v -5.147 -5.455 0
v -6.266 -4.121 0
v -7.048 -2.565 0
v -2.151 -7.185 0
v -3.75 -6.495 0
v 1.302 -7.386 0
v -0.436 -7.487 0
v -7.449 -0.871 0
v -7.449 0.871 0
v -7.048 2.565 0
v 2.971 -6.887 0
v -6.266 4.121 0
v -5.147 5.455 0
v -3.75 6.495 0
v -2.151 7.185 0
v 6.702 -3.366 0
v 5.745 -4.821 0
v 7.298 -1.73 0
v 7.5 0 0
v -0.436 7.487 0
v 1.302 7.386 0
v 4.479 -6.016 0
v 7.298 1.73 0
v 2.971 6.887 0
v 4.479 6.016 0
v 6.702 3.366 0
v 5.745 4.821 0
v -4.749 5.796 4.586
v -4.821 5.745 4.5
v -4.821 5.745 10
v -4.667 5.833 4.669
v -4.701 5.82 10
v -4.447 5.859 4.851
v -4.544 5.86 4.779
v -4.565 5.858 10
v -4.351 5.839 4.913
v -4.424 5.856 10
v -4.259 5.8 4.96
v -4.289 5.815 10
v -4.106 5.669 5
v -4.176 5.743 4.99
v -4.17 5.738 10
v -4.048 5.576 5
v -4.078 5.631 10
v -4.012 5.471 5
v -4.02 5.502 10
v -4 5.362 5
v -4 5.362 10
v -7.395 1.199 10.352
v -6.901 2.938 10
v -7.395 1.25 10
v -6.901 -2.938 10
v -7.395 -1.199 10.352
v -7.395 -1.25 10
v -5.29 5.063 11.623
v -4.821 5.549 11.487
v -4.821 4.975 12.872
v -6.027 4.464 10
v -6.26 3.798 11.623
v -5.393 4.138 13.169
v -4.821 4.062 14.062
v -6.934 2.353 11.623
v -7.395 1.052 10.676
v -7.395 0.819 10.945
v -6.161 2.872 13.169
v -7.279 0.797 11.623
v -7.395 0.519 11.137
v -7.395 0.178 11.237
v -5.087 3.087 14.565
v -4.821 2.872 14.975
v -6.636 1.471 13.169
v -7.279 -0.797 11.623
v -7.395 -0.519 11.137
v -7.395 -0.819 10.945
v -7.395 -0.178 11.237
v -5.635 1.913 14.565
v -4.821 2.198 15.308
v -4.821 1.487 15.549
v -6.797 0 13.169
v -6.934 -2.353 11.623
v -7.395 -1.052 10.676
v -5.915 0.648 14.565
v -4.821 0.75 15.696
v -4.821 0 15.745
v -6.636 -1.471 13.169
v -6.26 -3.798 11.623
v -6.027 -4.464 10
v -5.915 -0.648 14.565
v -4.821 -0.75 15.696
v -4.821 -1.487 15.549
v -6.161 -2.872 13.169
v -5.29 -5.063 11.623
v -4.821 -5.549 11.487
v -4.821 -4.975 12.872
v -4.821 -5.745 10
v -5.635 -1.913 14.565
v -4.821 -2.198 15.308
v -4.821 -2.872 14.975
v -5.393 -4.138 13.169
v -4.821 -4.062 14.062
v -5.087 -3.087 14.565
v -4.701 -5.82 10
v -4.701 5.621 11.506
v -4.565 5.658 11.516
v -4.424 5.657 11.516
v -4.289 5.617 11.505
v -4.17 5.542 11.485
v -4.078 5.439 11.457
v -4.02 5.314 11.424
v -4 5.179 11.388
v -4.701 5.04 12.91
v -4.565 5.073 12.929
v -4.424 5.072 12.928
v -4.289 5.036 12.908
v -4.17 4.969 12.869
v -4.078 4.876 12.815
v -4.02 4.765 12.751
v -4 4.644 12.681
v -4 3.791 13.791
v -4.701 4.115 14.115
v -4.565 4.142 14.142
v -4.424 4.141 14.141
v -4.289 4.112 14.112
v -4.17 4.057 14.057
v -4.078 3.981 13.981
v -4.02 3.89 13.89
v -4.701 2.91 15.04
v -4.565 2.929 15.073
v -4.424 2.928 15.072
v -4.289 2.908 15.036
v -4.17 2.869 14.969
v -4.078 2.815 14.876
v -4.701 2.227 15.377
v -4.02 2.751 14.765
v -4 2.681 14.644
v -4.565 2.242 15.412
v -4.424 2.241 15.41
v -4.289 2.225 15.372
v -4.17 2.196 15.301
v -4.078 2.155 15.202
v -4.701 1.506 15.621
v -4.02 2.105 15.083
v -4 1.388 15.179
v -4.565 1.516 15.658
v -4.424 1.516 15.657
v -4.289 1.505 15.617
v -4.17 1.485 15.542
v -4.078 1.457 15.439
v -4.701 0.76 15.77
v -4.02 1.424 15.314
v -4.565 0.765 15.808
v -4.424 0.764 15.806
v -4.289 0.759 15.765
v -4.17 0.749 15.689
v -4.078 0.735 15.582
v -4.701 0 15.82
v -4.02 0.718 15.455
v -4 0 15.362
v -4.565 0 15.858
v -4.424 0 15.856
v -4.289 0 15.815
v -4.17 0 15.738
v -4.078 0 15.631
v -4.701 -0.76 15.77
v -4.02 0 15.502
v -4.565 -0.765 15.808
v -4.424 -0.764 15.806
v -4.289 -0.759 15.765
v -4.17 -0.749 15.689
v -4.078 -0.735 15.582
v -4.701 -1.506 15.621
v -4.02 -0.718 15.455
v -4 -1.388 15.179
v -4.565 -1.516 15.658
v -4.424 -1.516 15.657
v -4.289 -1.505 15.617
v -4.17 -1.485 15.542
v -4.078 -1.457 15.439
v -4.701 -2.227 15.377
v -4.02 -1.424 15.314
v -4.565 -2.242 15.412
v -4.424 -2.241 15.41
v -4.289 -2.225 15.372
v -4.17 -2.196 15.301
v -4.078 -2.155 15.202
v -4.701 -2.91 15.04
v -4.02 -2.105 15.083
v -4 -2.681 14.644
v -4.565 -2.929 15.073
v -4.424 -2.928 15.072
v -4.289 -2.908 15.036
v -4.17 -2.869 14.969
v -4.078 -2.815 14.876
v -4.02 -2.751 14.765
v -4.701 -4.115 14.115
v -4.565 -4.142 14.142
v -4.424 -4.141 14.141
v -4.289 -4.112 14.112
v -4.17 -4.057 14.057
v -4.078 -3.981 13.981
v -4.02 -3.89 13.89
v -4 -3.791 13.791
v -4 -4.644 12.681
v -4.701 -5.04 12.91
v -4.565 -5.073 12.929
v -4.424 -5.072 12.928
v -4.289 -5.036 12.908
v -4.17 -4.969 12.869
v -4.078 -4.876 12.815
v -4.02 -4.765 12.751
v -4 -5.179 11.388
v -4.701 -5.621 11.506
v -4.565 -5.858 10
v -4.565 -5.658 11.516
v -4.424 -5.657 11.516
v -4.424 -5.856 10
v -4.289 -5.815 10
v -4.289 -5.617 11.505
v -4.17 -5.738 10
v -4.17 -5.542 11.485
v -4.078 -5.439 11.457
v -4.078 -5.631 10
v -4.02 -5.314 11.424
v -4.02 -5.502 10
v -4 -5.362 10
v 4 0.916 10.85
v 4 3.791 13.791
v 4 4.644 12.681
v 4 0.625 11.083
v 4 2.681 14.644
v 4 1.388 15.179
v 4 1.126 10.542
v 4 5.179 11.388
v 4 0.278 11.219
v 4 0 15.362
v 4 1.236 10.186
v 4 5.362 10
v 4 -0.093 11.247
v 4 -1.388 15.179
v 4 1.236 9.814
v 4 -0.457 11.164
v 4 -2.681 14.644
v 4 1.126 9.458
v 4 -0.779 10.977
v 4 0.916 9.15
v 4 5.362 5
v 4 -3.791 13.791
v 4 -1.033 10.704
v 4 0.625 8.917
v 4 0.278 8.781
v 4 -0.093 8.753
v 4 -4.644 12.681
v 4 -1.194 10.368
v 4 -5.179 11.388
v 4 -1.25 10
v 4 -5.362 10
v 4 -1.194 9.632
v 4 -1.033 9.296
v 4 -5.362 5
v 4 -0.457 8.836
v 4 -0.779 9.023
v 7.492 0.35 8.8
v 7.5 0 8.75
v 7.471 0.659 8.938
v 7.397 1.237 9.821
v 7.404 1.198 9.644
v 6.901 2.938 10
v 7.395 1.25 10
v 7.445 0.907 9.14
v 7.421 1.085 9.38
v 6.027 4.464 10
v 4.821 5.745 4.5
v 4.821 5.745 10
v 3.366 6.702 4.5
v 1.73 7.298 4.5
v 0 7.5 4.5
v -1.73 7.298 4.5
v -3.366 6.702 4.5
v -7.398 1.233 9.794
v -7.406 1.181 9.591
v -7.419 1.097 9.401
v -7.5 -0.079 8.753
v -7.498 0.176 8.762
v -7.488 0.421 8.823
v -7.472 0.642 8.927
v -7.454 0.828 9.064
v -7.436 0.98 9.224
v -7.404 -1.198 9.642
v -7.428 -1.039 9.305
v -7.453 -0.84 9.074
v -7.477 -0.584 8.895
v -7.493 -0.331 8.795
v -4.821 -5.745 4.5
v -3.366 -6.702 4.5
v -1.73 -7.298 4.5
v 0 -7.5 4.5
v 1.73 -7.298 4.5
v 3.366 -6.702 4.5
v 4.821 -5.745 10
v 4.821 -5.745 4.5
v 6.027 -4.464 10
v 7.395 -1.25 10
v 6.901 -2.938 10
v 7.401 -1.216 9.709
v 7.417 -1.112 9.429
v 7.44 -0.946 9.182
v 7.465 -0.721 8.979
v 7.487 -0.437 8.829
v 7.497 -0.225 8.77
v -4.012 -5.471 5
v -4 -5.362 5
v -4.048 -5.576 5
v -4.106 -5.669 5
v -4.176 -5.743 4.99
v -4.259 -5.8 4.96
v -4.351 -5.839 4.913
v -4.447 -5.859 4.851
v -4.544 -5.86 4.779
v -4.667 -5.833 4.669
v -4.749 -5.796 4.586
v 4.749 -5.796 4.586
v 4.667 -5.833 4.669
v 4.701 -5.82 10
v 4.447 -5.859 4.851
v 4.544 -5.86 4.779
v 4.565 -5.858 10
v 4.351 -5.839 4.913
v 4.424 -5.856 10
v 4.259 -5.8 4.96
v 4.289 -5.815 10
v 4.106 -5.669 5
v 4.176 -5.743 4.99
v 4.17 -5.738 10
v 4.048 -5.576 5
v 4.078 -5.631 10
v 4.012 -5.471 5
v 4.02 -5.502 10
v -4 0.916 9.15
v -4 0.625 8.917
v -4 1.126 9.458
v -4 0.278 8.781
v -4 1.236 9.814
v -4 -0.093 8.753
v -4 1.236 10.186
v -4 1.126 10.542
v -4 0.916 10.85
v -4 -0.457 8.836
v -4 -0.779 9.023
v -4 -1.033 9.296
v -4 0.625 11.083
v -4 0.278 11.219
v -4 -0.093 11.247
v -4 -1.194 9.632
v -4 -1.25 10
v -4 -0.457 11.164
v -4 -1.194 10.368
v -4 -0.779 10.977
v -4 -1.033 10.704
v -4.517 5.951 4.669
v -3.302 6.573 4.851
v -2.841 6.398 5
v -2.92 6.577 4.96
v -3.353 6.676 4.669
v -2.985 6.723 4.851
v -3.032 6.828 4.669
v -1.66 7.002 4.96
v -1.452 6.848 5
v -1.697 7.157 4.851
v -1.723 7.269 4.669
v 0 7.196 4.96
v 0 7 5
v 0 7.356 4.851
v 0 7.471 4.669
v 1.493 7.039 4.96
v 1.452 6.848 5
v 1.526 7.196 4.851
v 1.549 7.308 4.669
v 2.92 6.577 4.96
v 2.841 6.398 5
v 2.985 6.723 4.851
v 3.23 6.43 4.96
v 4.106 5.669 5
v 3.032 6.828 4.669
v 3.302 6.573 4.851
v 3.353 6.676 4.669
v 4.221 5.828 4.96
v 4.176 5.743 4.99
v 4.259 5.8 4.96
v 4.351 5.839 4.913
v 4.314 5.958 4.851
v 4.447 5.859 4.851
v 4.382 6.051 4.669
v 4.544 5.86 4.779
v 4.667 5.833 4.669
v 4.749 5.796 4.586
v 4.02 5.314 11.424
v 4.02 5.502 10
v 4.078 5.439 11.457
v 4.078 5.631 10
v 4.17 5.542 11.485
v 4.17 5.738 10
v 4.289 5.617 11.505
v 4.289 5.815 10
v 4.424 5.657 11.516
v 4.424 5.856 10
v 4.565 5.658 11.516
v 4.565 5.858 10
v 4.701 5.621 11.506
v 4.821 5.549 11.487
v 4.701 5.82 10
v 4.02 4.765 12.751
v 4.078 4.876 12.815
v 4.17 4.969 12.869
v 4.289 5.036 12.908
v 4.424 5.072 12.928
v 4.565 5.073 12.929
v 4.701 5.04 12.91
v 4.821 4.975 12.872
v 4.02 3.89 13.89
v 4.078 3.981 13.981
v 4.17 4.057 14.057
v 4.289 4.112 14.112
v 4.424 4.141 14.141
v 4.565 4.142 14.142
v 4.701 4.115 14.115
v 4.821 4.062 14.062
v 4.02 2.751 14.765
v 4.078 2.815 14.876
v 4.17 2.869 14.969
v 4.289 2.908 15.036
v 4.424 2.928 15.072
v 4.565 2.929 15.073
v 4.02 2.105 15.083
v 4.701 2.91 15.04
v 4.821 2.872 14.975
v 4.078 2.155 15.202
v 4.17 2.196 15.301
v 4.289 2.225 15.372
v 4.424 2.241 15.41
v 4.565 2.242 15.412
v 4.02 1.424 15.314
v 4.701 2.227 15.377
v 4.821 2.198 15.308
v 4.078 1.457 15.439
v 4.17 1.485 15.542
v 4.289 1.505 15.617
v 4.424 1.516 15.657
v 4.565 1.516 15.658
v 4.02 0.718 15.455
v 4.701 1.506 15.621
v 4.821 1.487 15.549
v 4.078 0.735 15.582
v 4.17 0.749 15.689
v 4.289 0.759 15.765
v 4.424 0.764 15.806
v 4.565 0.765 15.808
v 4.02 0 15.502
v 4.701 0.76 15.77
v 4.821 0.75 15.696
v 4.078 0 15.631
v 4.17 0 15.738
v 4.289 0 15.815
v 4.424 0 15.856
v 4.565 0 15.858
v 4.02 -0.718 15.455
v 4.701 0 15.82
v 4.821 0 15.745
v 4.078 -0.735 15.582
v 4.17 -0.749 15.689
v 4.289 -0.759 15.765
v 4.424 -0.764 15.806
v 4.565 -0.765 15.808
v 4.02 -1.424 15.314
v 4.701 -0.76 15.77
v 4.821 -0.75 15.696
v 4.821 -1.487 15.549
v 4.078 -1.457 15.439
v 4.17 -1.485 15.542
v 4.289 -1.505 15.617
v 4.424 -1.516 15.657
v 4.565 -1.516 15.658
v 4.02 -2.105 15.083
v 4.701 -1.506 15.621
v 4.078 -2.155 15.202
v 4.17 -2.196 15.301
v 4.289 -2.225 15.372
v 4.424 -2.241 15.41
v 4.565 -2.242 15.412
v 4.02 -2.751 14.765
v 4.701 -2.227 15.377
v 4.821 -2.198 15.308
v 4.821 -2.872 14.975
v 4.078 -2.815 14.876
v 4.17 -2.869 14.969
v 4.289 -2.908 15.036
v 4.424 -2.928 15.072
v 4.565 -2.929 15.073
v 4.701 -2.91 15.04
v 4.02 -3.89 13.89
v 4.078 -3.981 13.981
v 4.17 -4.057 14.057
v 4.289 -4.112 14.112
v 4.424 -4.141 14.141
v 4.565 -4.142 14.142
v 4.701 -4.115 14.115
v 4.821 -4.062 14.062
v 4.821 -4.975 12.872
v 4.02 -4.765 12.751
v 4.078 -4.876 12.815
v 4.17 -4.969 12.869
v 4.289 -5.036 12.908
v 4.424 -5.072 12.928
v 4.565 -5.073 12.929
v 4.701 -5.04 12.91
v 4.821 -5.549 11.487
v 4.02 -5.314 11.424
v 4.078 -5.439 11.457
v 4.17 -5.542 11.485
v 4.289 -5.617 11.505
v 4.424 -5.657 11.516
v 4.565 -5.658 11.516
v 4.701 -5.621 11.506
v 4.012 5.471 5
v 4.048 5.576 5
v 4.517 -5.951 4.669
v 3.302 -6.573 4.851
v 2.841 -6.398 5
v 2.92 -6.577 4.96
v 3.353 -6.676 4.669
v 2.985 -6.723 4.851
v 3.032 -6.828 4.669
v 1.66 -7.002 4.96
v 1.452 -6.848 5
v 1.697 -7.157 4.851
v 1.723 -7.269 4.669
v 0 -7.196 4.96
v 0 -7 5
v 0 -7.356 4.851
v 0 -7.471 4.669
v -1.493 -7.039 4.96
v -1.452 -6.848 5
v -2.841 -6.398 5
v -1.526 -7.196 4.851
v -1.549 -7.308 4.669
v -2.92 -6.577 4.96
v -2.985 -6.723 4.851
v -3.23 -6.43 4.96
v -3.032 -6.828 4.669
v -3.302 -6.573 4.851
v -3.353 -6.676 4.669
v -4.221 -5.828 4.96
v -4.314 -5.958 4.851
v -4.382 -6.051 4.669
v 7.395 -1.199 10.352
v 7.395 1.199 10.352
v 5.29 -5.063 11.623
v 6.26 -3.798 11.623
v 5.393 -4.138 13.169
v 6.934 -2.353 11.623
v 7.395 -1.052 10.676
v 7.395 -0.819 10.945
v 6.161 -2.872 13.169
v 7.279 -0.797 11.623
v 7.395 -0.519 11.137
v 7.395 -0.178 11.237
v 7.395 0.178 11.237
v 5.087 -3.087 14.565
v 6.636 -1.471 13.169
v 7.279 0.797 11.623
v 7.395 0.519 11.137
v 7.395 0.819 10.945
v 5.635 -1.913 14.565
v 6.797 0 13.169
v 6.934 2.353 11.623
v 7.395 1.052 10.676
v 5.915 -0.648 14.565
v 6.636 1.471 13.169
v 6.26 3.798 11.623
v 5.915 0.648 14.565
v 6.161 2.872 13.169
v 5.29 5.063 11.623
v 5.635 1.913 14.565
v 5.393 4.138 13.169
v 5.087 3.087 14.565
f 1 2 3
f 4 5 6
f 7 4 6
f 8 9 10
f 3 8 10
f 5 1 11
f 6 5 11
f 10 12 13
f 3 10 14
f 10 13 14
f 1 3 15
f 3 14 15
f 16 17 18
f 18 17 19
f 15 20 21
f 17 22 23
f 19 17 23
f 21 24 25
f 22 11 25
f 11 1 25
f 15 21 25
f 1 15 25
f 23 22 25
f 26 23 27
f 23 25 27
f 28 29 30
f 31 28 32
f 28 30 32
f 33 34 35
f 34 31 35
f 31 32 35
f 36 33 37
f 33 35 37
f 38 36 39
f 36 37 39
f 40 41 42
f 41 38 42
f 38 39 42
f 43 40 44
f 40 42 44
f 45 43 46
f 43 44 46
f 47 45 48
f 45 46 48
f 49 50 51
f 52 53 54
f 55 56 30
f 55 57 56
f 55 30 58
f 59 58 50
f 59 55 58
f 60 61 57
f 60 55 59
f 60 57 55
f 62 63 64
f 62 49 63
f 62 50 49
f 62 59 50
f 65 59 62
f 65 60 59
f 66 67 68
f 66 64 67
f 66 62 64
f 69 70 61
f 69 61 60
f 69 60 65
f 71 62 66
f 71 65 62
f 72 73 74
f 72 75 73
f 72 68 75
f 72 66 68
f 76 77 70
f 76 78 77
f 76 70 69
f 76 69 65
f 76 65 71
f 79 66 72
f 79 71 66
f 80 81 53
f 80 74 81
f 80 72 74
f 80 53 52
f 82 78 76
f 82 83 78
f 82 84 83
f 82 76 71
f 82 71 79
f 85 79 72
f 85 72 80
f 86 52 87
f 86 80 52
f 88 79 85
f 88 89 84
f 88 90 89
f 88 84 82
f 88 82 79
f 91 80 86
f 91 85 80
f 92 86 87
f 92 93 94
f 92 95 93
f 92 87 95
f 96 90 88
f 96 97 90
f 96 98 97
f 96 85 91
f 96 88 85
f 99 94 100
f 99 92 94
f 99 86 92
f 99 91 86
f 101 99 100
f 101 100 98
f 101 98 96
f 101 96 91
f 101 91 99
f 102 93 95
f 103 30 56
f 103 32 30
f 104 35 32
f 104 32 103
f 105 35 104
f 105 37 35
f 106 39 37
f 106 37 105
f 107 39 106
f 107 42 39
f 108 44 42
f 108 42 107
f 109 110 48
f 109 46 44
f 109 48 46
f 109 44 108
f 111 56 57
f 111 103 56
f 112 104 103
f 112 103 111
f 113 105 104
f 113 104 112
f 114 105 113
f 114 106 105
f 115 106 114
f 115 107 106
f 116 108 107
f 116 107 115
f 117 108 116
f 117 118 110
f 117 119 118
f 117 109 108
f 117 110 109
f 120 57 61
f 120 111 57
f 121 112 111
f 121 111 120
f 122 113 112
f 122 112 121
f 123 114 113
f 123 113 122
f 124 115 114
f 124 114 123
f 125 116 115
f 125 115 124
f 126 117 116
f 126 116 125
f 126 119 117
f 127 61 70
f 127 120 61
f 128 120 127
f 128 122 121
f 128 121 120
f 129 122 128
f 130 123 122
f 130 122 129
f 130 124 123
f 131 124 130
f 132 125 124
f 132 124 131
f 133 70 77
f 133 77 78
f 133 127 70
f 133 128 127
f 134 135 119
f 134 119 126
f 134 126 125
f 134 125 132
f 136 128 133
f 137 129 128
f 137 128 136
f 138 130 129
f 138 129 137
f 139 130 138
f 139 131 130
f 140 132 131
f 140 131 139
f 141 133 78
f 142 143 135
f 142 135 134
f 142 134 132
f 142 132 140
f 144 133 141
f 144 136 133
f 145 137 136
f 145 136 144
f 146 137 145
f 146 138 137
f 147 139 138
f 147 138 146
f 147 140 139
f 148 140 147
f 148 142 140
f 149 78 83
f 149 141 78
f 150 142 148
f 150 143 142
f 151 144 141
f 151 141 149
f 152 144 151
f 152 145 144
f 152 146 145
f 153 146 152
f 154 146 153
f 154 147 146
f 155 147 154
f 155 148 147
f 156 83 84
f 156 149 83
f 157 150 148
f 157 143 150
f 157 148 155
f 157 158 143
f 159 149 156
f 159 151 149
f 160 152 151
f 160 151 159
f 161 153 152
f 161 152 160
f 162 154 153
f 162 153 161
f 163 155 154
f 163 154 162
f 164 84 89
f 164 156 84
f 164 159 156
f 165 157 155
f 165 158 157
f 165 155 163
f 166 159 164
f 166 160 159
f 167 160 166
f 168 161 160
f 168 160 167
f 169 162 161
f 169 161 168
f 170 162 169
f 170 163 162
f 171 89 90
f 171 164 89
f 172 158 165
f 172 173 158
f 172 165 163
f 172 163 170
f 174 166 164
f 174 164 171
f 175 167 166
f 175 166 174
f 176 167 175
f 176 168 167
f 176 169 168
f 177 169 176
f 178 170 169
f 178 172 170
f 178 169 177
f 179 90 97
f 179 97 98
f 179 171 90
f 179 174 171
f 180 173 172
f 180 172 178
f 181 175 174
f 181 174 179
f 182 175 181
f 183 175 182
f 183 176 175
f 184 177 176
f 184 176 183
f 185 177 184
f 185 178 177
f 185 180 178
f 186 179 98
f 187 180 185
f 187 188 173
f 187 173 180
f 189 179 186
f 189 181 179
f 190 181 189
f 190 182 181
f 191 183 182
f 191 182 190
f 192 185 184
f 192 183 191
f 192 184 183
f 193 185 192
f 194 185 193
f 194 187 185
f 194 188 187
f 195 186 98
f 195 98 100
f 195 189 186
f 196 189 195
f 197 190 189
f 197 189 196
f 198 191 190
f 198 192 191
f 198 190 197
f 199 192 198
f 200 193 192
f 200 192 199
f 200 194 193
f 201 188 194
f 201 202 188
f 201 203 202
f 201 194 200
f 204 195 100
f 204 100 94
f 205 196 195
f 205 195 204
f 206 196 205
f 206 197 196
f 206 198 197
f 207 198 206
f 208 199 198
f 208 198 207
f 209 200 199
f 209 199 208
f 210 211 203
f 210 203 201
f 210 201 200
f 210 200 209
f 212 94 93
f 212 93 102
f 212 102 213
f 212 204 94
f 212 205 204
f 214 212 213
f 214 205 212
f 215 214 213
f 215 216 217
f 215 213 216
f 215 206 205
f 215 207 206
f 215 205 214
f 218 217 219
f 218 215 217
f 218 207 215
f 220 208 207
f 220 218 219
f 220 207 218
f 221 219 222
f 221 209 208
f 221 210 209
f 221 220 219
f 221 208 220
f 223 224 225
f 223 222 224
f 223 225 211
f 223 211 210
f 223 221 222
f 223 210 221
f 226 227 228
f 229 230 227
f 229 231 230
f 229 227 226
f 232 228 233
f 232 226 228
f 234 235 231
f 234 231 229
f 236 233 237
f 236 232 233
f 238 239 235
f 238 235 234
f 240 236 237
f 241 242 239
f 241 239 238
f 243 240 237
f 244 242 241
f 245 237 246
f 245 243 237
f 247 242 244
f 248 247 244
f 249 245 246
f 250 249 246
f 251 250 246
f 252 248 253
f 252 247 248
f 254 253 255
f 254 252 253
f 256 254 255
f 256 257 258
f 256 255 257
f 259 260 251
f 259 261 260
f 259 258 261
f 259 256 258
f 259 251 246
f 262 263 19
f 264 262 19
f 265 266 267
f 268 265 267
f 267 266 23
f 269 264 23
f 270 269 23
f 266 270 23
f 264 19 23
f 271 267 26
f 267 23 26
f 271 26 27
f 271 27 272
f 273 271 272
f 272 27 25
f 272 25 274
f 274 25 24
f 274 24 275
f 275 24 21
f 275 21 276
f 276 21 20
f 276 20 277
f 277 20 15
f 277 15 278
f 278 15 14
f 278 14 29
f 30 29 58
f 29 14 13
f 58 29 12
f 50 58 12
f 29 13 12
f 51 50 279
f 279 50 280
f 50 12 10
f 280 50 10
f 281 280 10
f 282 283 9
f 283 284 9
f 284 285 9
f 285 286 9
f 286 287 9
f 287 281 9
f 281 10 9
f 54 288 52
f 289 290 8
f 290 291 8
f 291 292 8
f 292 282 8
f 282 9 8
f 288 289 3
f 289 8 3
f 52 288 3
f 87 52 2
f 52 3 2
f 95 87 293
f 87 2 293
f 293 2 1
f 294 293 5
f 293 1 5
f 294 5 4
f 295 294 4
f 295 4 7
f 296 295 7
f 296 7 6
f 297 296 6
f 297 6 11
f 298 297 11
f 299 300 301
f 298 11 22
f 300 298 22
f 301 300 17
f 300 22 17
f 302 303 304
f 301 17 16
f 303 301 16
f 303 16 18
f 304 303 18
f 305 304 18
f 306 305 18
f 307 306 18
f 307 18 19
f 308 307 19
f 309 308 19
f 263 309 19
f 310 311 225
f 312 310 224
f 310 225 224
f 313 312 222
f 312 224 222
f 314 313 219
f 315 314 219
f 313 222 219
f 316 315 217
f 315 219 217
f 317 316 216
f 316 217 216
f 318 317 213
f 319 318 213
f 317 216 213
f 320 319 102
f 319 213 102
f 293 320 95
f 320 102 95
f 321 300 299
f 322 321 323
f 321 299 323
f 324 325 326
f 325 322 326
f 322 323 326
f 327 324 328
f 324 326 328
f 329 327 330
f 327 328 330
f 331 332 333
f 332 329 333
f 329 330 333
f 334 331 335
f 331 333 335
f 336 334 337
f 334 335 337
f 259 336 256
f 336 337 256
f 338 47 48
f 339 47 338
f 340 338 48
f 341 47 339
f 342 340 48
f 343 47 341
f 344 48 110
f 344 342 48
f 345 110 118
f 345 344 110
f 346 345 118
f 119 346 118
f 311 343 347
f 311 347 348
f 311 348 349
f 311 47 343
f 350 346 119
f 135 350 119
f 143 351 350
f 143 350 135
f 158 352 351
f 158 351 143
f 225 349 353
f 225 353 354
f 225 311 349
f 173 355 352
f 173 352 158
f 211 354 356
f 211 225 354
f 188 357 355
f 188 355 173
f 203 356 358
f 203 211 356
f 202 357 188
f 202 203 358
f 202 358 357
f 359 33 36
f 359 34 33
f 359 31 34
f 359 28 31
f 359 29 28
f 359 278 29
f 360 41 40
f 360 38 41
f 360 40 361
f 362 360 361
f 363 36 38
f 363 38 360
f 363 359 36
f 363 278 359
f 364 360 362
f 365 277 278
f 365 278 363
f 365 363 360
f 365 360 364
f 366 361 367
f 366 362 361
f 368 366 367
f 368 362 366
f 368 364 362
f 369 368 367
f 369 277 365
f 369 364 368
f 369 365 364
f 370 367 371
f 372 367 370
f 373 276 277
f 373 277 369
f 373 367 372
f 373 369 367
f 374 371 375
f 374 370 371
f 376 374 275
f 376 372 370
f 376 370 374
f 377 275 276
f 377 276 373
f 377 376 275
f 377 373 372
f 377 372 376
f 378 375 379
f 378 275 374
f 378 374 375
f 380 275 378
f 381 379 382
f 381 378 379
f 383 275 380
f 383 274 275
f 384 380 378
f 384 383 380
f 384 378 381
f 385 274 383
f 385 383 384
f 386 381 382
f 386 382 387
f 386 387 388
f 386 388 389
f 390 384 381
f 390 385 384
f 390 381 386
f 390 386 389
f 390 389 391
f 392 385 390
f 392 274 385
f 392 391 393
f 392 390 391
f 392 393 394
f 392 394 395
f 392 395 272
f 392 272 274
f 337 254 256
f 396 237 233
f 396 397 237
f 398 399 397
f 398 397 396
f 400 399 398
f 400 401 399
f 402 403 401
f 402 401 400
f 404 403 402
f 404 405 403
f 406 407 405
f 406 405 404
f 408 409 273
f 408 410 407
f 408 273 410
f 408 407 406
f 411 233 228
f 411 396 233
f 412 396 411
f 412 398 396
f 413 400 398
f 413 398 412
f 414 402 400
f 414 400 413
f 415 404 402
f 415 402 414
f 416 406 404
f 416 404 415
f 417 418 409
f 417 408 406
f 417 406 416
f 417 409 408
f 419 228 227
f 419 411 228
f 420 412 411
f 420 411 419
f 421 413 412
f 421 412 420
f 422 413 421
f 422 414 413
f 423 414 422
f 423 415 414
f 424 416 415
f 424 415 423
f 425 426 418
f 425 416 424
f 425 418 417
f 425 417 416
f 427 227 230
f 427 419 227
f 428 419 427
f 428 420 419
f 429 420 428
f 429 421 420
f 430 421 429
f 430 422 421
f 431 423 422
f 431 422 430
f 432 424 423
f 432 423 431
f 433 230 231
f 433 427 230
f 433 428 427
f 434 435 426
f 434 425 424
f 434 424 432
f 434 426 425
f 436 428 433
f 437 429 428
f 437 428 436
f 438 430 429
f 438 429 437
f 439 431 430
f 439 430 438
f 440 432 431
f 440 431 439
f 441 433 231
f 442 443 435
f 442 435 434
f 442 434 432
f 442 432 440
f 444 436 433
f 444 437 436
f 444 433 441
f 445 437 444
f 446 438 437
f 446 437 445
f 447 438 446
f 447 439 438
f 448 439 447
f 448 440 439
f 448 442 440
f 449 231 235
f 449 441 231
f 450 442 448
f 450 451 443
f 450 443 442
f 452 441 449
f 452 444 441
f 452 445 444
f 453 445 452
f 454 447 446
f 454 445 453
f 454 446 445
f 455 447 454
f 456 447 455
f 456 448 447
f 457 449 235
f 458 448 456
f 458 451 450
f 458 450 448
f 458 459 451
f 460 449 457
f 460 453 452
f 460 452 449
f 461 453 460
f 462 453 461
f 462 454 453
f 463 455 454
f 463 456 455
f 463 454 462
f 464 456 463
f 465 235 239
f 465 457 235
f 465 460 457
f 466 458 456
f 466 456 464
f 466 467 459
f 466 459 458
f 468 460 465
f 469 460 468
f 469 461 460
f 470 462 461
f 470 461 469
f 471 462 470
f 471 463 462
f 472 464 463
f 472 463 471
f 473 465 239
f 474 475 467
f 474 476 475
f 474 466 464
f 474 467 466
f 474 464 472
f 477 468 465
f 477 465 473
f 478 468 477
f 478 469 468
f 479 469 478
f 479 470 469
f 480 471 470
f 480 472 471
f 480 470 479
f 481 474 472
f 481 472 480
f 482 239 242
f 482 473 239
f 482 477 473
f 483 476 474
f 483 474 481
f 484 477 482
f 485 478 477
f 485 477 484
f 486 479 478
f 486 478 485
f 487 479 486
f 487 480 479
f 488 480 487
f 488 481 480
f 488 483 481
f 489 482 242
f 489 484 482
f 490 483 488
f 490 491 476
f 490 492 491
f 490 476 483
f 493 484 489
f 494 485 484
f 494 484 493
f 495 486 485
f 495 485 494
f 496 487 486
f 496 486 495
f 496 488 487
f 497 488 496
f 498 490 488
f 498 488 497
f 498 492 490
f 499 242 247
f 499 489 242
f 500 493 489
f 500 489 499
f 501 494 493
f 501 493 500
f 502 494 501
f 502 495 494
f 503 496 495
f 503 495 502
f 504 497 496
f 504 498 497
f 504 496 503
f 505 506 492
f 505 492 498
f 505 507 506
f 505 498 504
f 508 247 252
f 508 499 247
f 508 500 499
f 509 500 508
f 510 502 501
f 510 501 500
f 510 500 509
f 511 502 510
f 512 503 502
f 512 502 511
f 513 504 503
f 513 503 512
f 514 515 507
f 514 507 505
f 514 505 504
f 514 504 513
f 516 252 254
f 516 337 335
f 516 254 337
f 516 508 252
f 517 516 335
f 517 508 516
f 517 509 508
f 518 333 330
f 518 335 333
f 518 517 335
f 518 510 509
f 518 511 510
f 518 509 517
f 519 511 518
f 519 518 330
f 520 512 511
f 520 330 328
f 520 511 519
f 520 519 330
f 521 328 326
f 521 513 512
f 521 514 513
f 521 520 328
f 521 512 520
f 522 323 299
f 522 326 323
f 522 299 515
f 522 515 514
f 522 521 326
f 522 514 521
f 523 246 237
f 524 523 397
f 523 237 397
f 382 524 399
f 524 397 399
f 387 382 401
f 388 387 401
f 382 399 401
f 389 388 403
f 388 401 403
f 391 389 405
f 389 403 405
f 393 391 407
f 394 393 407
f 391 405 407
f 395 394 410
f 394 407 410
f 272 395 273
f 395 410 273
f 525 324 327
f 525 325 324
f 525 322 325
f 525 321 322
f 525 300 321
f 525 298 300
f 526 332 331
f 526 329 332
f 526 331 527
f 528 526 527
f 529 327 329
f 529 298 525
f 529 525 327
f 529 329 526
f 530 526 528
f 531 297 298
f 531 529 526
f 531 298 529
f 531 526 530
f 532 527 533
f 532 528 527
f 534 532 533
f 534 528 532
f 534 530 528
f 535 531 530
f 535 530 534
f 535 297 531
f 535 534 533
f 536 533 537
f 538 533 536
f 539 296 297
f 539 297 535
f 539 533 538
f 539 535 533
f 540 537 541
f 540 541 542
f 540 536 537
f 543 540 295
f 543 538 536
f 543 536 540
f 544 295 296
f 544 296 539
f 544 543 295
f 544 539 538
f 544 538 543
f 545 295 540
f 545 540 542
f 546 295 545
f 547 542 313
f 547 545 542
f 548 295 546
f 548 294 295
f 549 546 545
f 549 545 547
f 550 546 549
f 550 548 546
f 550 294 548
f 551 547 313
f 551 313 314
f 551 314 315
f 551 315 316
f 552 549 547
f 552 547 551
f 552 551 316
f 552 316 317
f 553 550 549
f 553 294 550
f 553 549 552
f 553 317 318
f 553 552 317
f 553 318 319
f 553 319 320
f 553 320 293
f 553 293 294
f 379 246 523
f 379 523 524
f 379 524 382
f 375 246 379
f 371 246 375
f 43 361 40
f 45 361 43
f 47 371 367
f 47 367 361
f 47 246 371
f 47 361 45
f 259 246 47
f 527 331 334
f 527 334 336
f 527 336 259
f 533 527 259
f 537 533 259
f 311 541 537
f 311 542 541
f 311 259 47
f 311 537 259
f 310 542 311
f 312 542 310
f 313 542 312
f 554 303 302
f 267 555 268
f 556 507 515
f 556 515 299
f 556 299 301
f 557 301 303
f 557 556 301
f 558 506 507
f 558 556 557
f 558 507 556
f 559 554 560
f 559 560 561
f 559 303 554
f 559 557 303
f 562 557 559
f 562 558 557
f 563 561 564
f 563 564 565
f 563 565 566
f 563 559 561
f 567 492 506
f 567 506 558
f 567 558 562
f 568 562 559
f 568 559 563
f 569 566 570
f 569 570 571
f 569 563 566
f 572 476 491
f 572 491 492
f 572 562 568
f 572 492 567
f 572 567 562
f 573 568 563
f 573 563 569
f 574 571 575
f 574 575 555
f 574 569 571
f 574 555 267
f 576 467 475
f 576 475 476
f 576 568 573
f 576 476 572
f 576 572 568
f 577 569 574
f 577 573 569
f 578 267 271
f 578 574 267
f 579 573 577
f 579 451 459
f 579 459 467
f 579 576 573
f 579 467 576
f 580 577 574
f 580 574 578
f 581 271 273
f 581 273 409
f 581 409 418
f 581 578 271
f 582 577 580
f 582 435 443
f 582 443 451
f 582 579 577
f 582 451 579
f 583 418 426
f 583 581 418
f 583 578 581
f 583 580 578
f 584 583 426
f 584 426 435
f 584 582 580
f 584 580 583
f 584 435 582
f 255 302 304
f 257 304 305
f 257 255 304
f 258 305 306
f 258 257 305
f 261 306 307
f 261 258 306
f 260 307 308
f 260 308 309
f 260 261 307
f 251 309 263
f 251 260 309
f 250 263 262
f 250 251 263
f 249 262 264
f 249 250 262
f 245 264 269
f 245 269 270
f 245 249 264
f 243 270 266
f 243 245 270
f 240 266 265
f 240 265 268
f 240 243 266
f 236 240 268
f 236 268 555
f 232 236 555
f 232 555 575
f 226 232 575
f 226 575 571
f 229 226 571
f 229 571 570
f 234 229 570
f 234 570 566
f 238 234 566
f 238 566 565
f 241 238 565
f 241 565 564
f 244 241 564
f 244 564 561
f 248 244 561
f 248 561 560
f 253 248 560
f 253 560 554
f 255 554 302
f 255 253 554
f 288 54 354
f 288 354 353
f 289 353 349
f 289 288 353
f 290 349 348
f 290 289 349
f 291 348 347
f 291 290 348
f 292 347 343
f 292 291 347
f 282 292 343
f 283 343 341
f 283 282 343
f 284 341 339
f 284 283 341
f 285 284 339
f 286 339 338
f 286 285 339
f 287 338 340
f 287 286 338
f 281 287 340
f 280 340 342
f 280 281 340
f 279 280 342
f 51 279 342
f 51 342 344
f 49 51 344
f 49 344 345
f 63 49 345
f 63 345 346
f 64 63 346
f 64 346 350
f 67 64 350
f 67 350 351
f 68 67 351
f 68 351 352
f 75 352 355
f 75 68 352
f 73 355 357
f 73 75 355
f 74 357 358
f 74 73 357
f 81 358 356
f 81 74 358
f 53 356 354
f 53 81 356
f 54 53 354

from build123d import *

# Parameters (mm, degrees)
CROQUIS1_R                 = 7.5
SALIENTE_EXTRUIR1_DEPTH    = 10
C_PULA1_FACE_RADIUS        = 7.5
C_PULA1_HEIGHT             = 7.5
CORTAR_EXTRUIR1_DEPTH      = 10
CORTAR_EXTRUIR1_DEPTH_BACK = 19
CORTAR_EXTRUIR2_DEPTH      = 11
CORTAR_EXTRUIR2_DEPTH_BACK = 19
CROQUIS3_R                 = 1.25
REDONDEO1_R                = 0.5


with BuildPart() as part:
    # Croquis1 → Saliente-Extruir1 (new body)
    with BuildSketch(Plane.XY):
        Circle(CROQUIS1_R)
    extrude(amount=SALIENTE_EXTRUIR1_DEPTH)

    # Cúpula1: a dome of height H over a round flat face of radius A is a cap of a sphere of radius (A * A + H * H) / (2 * H)
    c_pula1_r = (C_PULA1_FACE_RADIUS * C_PULA1_FACE_RADIUS + C_PULA1_HEIGHT * C_PULA1_HEIGHT) / (2 * C_PULA1_HEIGHT)
    c_pula1_base = Plane((0, 0, 10), z_dir=(0, 0, 1))
    with Locations(c_pula1_base.offset(C_PULA1_HEIGHT - c_pula1_r)):
        c_pula1_ball = Sphere(c_pula1_r, mode=Mode.PRIVATE)
    add(split(c_pula1_ball, bisect_by=c_pula1_base, keep=Keep.TOP, mode=Mode.PRIVATE))

    # Croquis2 → Cortar-Extruir1 (cut, two sides: drawn at the far end of the back side and taken through both)
    with BuildSketch(Plane(origin=(0, 0, 0), x_dir=(1, 0, 0), z_dir=(0, 1, 0)).offset(-CORTAR_EXTRUIR1_DEPTH_BACK)):
        Polygon((-4, -10), (-4, -17.5), (4, -17.5), (4, -9.5), (4, -5), (-4, -5), align=None)
    extrude(amount=CORTAR_EXTRUIR1_DEPTH + CORTAR_EXTRUIR1_DEPTH_BACK, mode=Mode.SUBTRACT)

    # Croquis3 → Cortar-Extruir2 (cut, two sides: drawn at the far end of the back side and taken through both)
    with BuildSketch(Plane(origin=(0, 0, 0), x_dir=(0, 0, -1), z_dir=(1, 0, 0)).offset(-CORTAR_EXTRUIR2_DEPTH_BACK)):
        with Locations(Location((-10, 0, 0), (0, 0, 270))):
            Circle(CROQUIS3_R)
    extrude(amount=CORTAR_EXTRUIR2_DEPTH + CORTAR_EXTRUIR2_DEPTH_BACK, mode=Mode.SUBTRACT)

    # Redondeo1
    # the kernel refuses this fillet: 0.5 mm, written as the material it takes off along each edge
    with BuildSketch(Plane(origin=(0, 0, 5), x_dir=(-0.6663010614300323, 0.7456828384354923, 0), z_dir=(-0.7456828384354923, -0.6663010614300323, 0))) as redondeo1_piece_1_section:
        with BuildLine():
            CenterArc((7.5 - REDONDEO1_R, REDONDEO1_R), REDONDEO1_R, 270, 90)
            Line((7.5 - REDONDEO1_R, 0), (7.5, 0))
            Line((7.5, 0), (7.5, REDONDEO1_R))
        make_face()
    redondeo1_piece_1 = revolve(axis=Axis((0, 0, 5), (0, 0, -1)), revolution_arc=83.564433706, mode=Mode.PRIVATE)
    redondeo1_piece_1 = split(redondeo1_piece_1, bisect_by=Plane(origin=(4, 7.359307854, 4.859307854), z_dir=(-1, 0, 0)), keep=Keep.TOP, mode=Mode.PRIVATE)
    redondeo1_piece_1 = split(redondeo1_piece_1, bisect_by=Plane(origin=(-4, 7.359307854, 4.859307854), z_dir=(1, 0, 0)), keep=Keep.TOP, mode=Mode.PRIVATE)
    add(redondeo1_piece_1, mode=Mode.SUBTRACT)
    with BuildSketch(Plane(origin=(4, -6.34428877, 10), x_dir=(0.807803952835934, 0.5894512480117758, 0), z_dir=(0, 0, -1)), Plane(origin=(-4, 6.34428877, 10), x_dir=(-0.8078039528359331, -0.5894512480117771, 0), z_dir=(0, 0, -1))) as redondeo1_piece_2:
        with BuildLine():
            CenterArc((0.982970703, -0.498849769), REDONDEO1_R, 86.112875875, 130.005200885)
            Line((0.579068726, -0.793575393), (0, 0))
            ThreePointArc((0, 0), (0.508433122, 0.017253461), (1.016866244, 0))
        make_face()
    extrude(amount=5, mode=Mode.SUBTRACT)
    with BuildSketch(Plane(origin=(4, 6.34428877, 10), x_dir=(0.8078039528359339, -0.5894512480117758, 0), z_dir=(0, 0, -1)), Plane(origin=(-4, -6.34428877, 10), x_dir=(-0.8078039528359333, 0.5894512480117767, 0), z_dir=(0, 0, -1))) as redondeo1_piece_3:
        with BuildLine():
            CenterArc((0.982970703, 0.498849769), REDONDEO1_R, 143.88192324, 130.005200885)
            Line((0.579068726, 0.793575393), (0, 0))
            ThreePointArc((0, 0), (0.508433122, -0.017253461), (1.016866244, 0))
        make_face()
    extrude(amount=5, mode=Mode.SUBTRACT)
    with BuildSketch(Plane(origin=(-4, 0, 10), x_dir=(0, 1, 0), z_dir=(0, 0, -1))) as redondeo1_piece_4:
        with BuildLine():
            CenterArc((5.361902647, -0.5), REDONDEO1_R, 319.994799115, 130.005200885)
            ThreePointArc((5.744895694, -0.821428571), (6.058529646, -0.42088436), (6.34428877, 0))
            Line((6.34428877, 0), (5.361902647, 0))
        make_face()
    revolve(axis=Axis((-4, 0, 10), (1, 0, 0)), revolution_arc=180, mode=Mode.SUBTRACT)
    with BuildSketch(Plane(origin=(4, 0, 10), x_dir=(0, 1, 0), z_dir=(0, 0, -1))) as redondeo1_piece_5:
        with BuildLine():
            CenterArc((5.361902647, 0.5), REDONDEO1_R, 270, 130.005200885)
            Line((5.361902647, 0), (6.34428877, 0))
            ThreePointArc((6.34428877, 0), (6.058529646, 0.42088436), (5.744895694, 0.821428571))
        make_face()
    revolve(axis=Axis((4, 0, 10), (1, 0, 0)), revolution_arc=180, mode=Mode.SUBTRACT)
    with BuildSketch(Plane(origin=(0, 0, 5), x_dir=(0.6663010614300334, -0.7456828384354912, 0), z_dir=(0.7456828384354912, 0.6663010614300334, 0))) as redondeo1_piece_6_section:
        with BuildLine():
            CenterArc((7.5 - REDONDEO1_R, REDONDEO1_R), REDONDEO1_R, 270, 90)
            Line((7.5 - REDONDEO1_R, 0), (7.5, 0))
            Line((7.5, 0), (7.5, REDONDEO1_R))
        make_face()
    redondeo1_piece_6 = revolve(axis=Axis((0, 0, 5), (0, 0, -1)), revolution_arc=83.564433706, mode=Mode.PRIVATE)
    redondeo1_piece_6 = split(redondeo1_piece_6, bisect_by=Plane(origin=(4, -7.359307854, 4.859307854), z_dir=(-1, 0, 0)), keep=Keep.TOP, mode=Mode.PRIVATE)
    redondeo1_piece_6 = split(redondeo1_piece_6, bisect_by=Plane(origin=(-4, -7.359307854, 4.859307854), z_dir=(1, 0, 0)), keep=Keep.TOP, mode=Mode.PRIVATE)
    add(redondeo1_piece_6, mode=Mode.SUBTRACT)
    with BuildSketch(Plane(origin=(-4, 6.34428877, 10), x_dir=(-0.8078039528359331, -0.5894512480117771, 0), z_dir=(0, 0, -1))) as redondeo1_piece_7a_section:
        with BuildLine():
            CenterArc((0.982970703, -0.498849769), REDONDEO1_R, 86.112875875, 130.005200885)
            Line((0.579068726, -0.793575393), (0, 0))
            ThreePointArc((0, 0), (0.508433122, 0.017253461), (1.016866244, 0))
        make_face()
    redondeo1_piece_7a = extrude(amount=7.54216561, mode=Mode.PRIVATE)
    redondeo1_piece_7a = split(redondeo1_piece_7a, bisect_by=Plane(origin=(-4.209576919, 5.957871406, 5), z_dir=(0, 0, -1)), keep=Keep.TOP, mode=Mode.PRIVATE)
    with BuildSketch(Plane(origin=(0, 0, 5), x_dir=(-0.6663010614300323, 0.7456828384354923, 0), z_dir=(-0.7456828384354923, -0.6663010614300323, 0))) as redondeo1_piece_7b_section:
        with BuildLine():
            CenterArc((7.5 - REDONDEO1_R, REDONDEO1_R), REDONDEO1_R, 270, 90)
            Line((7.5 - REDONDEO1_R, 0), (7.5, 0))
            Line((7.5, 0), (7.5, REDONDEO1_R))
        make_face()
    redondeo1_piece_7b = revolve(axis=Axis((0, 0, 5), (0, 0, -1)), revolution_arc=83.564433706, mode=Mode.PRIVATE)
    redondeo1_piece_7b = split(redondeo1_piece_7b, bisect_by=Plane(origin=(-4, 5.878976183, 4.882052038), z_dir=(-1, 0, 0)), keep=Keep.TOP, mode=Mode.PRIVATE)
    redondeo1_piece_7 = redondeo1_piece_7a & redondeo1_piece_7b
    add(redondeo1_piece_7, mode=Mode.SUBTRACT)
    with BuildSketch(Plane(origin=(0, 0, 5), x_dir=(-0.6663010614300323, 0.7456828384354923, 0), z_dir=(-0.7456828384354923, -0.6663010614300323, 0))) as redondeo1_piece_8a_section:
        with BuildLine():
            CenterArc((7.5 - REDONDEO1_R, REDONDEO1_R), REDONDEO1_R, 270, 90)
            Line((7.5 - REDONDEO1_R, 0), (7.5, 0))
            Line((7.5, 0), (7.5, REDONDEO1_R))
        make_face()
    redondeo1_piece_8a = revolve(axis=Axis((0, 0, 5), (0, 0, -1)), revolution_arc=83.564433706, mode=Mode.PRIVATE)
    redondeo1_piece_8a = split(redondeo1_piece_8a, bisect_by=Plane(origin=(4, 5.878976375, 4.882052003), z_dir=(1, 0, 0)), keep=Keep.TOP, mode=Mode.PRIVATE)
    with BuildSketch(Plane(origin=(4, 6.34428877, 10), x_dir=(0.8078039528359339, -0.5894512480117758, 0), z_dir=(0, 0, -1))) as redondeo1_piece_8b_section:
        with BuildLine():
            CenterArc((0.982970703, 0.498849769), REDONDEO1_R, 143.88192324, 130.005200885)
            Line((0.579068726, 0.793575393), (0, 0))
            ThreePointArc((0, 0), (0.508433122, -0.017253461), (1.016866244, 0))
        make_face()
    redondeo1_piece_8b = extrude(amount=7.54216561, mode=Mode.PRIVATE)
    redondeo1_piece_8b = split(redondeo1_piece_8b, bisect_by=Plane(origin=(4.209576919, 5.957871406, 5), z_dir=(0, 0, -1)), keep=Keep.TOP, mode=Mode.PRIVATE)
    redondeo1_piece_8 = redondeo1_piece_8a & redondeo1_piece_8b
    add(redondeo1_piece_8, mode=Mode.SUBTRACT)
    with BuildSketch(Plane(origin=(4, -6.34428877, 10), x_dir=(0.807803952835934, 0.5894512480117758, 0), z_dir=(0, 0, -1))) as redondeo1_piece_9a_section:
        with BuildLine():
            CenterArc((0.982970703, -0.498849769), REDONDEO1_R, 86.112875875, 130.005200885)
            Line((0.579068726, -0.793575393), (0, 0))
            ThreePointArc((0, 0), (0.508433122, 0.017253461), (1.016866244, 0))
        make_face()
    redondeo1_piece_9a = extrude(amount=7.54216561, mode=Mode.PRIVATE)
    redondeo1_piece_9a = split(redondeo1_piece_9a, bisect_by=Plane(origin=(4.209576919, -5.957871406, 5), z_dir=(0, 0, -1)), keep=Keep.TOP, mode=Mode.PRIVATE)
    with BuildSketch(Plane(origin=(0, 0, 5), x_dir=(0.6663010614300334, -0.7456828384354912, 0), z_dir=(0.7456828384354912, 0.6663010614300334, 0))) as redondeo1_piece_9b_section:
        with BuildLine():
            CenterArc((7.5 - REDONDEO1_R, REDONDEO1_R), REDONDEO1_R, 270, 90)
            Line((7.5 - REDONDEO1_R, 0), (7.5, 0))
            Line((7.5, 0), (7.5, REDONDEO1_R))
        make_face()
    redondeo1_piece_9b = revolve(axis=Axis((0, 0, 5), (0, 0, -1)), revolution_arc=83.564433706, mode=Mode.PRIVATE)
    redondeo1_piece_9b = split(redondeo1_piece_9b, bisect_by=Plane(origin=(4, -5.878976176, 4.88205204), z_dir=(1, 0, 0)), keep=Keep.TOP, mode=Mode.PRIVATE)
    redondeo1_piece_9 = redondeo1_piece_9a & redondeo1_piece_9b
    add(redondeo1_piece_9, mode=Mode.SUBTRACT)
    with BuildSketch(Plane(origin=(0, 0, 5), x_dir=(0.6663010614300334, -0.7456828384354912, 0), z_dir=(0.7456828384354912, 0.6663010614300334, 0))) as redondeo1_piece_10a_section:
        with BuildLine():
            CenterArc((7.5 - REDONDEO1_R, REDONDEO1_R), REDONDEO1_R, 270, 90)
            Line((7.5 - REDONDEO1_R, 0), (7.5, 0))
            Line((7.5, 0), (7.5, REDONDEO1_R))
        make_face()
    redondeo1_piece_10a = revolve(axis=Axis((0, 0, 5), (0, 0, -1)), revolution_arc=83.564433706, mode=Mode.PRIVATE)
    redondeo1_piece_10a = split(redondeo1_piece_10a, bisect_by=Plane(origin=(-4, -5.878976383, 4.882052), z_dir=(-1, 0, 0)), keep=Keep.TOP, mode=Mode.PRIVATE)
    with BuildSketch(Plane(origin=(-4, -6.34428877, 10), x_dir=(-0.8078039528359333, 0.5894512480117767, 0), z_dir=(0, 0, -1))) as redondeo1_piece_10b_section:
        with BuildLine():
            CenterArc((0.982970703, 0.498849769), REDONDEO1_R, 143.88192324, 130.005200885)
            Line((0.579068726, 0.793575393), (0, 0))
            ThreePointArc((0, 0), (0.508433122, -0.017253461), (1.016866244, 0))
        make_face()
    redondeo1_piece_10b = extrude(amount=7.54216561, mode=Mode.PRIVATE)
    redondeo1_piece_10b = split(redondeo1_piece_10b, bisect_by=Plane(origin=(-4.209576919, -5.957871406, 5), z_dir=(0, 0, -1)), keep=Keep.TOP, mode=Mode.PRIVATE)
    redondeo1_piece_10 = redondeo1_piece_10a & redondeo1_piece_10b
    add(redondeo1_piece_10, mode=Mode.SUBTRACT)


solid = part.part
